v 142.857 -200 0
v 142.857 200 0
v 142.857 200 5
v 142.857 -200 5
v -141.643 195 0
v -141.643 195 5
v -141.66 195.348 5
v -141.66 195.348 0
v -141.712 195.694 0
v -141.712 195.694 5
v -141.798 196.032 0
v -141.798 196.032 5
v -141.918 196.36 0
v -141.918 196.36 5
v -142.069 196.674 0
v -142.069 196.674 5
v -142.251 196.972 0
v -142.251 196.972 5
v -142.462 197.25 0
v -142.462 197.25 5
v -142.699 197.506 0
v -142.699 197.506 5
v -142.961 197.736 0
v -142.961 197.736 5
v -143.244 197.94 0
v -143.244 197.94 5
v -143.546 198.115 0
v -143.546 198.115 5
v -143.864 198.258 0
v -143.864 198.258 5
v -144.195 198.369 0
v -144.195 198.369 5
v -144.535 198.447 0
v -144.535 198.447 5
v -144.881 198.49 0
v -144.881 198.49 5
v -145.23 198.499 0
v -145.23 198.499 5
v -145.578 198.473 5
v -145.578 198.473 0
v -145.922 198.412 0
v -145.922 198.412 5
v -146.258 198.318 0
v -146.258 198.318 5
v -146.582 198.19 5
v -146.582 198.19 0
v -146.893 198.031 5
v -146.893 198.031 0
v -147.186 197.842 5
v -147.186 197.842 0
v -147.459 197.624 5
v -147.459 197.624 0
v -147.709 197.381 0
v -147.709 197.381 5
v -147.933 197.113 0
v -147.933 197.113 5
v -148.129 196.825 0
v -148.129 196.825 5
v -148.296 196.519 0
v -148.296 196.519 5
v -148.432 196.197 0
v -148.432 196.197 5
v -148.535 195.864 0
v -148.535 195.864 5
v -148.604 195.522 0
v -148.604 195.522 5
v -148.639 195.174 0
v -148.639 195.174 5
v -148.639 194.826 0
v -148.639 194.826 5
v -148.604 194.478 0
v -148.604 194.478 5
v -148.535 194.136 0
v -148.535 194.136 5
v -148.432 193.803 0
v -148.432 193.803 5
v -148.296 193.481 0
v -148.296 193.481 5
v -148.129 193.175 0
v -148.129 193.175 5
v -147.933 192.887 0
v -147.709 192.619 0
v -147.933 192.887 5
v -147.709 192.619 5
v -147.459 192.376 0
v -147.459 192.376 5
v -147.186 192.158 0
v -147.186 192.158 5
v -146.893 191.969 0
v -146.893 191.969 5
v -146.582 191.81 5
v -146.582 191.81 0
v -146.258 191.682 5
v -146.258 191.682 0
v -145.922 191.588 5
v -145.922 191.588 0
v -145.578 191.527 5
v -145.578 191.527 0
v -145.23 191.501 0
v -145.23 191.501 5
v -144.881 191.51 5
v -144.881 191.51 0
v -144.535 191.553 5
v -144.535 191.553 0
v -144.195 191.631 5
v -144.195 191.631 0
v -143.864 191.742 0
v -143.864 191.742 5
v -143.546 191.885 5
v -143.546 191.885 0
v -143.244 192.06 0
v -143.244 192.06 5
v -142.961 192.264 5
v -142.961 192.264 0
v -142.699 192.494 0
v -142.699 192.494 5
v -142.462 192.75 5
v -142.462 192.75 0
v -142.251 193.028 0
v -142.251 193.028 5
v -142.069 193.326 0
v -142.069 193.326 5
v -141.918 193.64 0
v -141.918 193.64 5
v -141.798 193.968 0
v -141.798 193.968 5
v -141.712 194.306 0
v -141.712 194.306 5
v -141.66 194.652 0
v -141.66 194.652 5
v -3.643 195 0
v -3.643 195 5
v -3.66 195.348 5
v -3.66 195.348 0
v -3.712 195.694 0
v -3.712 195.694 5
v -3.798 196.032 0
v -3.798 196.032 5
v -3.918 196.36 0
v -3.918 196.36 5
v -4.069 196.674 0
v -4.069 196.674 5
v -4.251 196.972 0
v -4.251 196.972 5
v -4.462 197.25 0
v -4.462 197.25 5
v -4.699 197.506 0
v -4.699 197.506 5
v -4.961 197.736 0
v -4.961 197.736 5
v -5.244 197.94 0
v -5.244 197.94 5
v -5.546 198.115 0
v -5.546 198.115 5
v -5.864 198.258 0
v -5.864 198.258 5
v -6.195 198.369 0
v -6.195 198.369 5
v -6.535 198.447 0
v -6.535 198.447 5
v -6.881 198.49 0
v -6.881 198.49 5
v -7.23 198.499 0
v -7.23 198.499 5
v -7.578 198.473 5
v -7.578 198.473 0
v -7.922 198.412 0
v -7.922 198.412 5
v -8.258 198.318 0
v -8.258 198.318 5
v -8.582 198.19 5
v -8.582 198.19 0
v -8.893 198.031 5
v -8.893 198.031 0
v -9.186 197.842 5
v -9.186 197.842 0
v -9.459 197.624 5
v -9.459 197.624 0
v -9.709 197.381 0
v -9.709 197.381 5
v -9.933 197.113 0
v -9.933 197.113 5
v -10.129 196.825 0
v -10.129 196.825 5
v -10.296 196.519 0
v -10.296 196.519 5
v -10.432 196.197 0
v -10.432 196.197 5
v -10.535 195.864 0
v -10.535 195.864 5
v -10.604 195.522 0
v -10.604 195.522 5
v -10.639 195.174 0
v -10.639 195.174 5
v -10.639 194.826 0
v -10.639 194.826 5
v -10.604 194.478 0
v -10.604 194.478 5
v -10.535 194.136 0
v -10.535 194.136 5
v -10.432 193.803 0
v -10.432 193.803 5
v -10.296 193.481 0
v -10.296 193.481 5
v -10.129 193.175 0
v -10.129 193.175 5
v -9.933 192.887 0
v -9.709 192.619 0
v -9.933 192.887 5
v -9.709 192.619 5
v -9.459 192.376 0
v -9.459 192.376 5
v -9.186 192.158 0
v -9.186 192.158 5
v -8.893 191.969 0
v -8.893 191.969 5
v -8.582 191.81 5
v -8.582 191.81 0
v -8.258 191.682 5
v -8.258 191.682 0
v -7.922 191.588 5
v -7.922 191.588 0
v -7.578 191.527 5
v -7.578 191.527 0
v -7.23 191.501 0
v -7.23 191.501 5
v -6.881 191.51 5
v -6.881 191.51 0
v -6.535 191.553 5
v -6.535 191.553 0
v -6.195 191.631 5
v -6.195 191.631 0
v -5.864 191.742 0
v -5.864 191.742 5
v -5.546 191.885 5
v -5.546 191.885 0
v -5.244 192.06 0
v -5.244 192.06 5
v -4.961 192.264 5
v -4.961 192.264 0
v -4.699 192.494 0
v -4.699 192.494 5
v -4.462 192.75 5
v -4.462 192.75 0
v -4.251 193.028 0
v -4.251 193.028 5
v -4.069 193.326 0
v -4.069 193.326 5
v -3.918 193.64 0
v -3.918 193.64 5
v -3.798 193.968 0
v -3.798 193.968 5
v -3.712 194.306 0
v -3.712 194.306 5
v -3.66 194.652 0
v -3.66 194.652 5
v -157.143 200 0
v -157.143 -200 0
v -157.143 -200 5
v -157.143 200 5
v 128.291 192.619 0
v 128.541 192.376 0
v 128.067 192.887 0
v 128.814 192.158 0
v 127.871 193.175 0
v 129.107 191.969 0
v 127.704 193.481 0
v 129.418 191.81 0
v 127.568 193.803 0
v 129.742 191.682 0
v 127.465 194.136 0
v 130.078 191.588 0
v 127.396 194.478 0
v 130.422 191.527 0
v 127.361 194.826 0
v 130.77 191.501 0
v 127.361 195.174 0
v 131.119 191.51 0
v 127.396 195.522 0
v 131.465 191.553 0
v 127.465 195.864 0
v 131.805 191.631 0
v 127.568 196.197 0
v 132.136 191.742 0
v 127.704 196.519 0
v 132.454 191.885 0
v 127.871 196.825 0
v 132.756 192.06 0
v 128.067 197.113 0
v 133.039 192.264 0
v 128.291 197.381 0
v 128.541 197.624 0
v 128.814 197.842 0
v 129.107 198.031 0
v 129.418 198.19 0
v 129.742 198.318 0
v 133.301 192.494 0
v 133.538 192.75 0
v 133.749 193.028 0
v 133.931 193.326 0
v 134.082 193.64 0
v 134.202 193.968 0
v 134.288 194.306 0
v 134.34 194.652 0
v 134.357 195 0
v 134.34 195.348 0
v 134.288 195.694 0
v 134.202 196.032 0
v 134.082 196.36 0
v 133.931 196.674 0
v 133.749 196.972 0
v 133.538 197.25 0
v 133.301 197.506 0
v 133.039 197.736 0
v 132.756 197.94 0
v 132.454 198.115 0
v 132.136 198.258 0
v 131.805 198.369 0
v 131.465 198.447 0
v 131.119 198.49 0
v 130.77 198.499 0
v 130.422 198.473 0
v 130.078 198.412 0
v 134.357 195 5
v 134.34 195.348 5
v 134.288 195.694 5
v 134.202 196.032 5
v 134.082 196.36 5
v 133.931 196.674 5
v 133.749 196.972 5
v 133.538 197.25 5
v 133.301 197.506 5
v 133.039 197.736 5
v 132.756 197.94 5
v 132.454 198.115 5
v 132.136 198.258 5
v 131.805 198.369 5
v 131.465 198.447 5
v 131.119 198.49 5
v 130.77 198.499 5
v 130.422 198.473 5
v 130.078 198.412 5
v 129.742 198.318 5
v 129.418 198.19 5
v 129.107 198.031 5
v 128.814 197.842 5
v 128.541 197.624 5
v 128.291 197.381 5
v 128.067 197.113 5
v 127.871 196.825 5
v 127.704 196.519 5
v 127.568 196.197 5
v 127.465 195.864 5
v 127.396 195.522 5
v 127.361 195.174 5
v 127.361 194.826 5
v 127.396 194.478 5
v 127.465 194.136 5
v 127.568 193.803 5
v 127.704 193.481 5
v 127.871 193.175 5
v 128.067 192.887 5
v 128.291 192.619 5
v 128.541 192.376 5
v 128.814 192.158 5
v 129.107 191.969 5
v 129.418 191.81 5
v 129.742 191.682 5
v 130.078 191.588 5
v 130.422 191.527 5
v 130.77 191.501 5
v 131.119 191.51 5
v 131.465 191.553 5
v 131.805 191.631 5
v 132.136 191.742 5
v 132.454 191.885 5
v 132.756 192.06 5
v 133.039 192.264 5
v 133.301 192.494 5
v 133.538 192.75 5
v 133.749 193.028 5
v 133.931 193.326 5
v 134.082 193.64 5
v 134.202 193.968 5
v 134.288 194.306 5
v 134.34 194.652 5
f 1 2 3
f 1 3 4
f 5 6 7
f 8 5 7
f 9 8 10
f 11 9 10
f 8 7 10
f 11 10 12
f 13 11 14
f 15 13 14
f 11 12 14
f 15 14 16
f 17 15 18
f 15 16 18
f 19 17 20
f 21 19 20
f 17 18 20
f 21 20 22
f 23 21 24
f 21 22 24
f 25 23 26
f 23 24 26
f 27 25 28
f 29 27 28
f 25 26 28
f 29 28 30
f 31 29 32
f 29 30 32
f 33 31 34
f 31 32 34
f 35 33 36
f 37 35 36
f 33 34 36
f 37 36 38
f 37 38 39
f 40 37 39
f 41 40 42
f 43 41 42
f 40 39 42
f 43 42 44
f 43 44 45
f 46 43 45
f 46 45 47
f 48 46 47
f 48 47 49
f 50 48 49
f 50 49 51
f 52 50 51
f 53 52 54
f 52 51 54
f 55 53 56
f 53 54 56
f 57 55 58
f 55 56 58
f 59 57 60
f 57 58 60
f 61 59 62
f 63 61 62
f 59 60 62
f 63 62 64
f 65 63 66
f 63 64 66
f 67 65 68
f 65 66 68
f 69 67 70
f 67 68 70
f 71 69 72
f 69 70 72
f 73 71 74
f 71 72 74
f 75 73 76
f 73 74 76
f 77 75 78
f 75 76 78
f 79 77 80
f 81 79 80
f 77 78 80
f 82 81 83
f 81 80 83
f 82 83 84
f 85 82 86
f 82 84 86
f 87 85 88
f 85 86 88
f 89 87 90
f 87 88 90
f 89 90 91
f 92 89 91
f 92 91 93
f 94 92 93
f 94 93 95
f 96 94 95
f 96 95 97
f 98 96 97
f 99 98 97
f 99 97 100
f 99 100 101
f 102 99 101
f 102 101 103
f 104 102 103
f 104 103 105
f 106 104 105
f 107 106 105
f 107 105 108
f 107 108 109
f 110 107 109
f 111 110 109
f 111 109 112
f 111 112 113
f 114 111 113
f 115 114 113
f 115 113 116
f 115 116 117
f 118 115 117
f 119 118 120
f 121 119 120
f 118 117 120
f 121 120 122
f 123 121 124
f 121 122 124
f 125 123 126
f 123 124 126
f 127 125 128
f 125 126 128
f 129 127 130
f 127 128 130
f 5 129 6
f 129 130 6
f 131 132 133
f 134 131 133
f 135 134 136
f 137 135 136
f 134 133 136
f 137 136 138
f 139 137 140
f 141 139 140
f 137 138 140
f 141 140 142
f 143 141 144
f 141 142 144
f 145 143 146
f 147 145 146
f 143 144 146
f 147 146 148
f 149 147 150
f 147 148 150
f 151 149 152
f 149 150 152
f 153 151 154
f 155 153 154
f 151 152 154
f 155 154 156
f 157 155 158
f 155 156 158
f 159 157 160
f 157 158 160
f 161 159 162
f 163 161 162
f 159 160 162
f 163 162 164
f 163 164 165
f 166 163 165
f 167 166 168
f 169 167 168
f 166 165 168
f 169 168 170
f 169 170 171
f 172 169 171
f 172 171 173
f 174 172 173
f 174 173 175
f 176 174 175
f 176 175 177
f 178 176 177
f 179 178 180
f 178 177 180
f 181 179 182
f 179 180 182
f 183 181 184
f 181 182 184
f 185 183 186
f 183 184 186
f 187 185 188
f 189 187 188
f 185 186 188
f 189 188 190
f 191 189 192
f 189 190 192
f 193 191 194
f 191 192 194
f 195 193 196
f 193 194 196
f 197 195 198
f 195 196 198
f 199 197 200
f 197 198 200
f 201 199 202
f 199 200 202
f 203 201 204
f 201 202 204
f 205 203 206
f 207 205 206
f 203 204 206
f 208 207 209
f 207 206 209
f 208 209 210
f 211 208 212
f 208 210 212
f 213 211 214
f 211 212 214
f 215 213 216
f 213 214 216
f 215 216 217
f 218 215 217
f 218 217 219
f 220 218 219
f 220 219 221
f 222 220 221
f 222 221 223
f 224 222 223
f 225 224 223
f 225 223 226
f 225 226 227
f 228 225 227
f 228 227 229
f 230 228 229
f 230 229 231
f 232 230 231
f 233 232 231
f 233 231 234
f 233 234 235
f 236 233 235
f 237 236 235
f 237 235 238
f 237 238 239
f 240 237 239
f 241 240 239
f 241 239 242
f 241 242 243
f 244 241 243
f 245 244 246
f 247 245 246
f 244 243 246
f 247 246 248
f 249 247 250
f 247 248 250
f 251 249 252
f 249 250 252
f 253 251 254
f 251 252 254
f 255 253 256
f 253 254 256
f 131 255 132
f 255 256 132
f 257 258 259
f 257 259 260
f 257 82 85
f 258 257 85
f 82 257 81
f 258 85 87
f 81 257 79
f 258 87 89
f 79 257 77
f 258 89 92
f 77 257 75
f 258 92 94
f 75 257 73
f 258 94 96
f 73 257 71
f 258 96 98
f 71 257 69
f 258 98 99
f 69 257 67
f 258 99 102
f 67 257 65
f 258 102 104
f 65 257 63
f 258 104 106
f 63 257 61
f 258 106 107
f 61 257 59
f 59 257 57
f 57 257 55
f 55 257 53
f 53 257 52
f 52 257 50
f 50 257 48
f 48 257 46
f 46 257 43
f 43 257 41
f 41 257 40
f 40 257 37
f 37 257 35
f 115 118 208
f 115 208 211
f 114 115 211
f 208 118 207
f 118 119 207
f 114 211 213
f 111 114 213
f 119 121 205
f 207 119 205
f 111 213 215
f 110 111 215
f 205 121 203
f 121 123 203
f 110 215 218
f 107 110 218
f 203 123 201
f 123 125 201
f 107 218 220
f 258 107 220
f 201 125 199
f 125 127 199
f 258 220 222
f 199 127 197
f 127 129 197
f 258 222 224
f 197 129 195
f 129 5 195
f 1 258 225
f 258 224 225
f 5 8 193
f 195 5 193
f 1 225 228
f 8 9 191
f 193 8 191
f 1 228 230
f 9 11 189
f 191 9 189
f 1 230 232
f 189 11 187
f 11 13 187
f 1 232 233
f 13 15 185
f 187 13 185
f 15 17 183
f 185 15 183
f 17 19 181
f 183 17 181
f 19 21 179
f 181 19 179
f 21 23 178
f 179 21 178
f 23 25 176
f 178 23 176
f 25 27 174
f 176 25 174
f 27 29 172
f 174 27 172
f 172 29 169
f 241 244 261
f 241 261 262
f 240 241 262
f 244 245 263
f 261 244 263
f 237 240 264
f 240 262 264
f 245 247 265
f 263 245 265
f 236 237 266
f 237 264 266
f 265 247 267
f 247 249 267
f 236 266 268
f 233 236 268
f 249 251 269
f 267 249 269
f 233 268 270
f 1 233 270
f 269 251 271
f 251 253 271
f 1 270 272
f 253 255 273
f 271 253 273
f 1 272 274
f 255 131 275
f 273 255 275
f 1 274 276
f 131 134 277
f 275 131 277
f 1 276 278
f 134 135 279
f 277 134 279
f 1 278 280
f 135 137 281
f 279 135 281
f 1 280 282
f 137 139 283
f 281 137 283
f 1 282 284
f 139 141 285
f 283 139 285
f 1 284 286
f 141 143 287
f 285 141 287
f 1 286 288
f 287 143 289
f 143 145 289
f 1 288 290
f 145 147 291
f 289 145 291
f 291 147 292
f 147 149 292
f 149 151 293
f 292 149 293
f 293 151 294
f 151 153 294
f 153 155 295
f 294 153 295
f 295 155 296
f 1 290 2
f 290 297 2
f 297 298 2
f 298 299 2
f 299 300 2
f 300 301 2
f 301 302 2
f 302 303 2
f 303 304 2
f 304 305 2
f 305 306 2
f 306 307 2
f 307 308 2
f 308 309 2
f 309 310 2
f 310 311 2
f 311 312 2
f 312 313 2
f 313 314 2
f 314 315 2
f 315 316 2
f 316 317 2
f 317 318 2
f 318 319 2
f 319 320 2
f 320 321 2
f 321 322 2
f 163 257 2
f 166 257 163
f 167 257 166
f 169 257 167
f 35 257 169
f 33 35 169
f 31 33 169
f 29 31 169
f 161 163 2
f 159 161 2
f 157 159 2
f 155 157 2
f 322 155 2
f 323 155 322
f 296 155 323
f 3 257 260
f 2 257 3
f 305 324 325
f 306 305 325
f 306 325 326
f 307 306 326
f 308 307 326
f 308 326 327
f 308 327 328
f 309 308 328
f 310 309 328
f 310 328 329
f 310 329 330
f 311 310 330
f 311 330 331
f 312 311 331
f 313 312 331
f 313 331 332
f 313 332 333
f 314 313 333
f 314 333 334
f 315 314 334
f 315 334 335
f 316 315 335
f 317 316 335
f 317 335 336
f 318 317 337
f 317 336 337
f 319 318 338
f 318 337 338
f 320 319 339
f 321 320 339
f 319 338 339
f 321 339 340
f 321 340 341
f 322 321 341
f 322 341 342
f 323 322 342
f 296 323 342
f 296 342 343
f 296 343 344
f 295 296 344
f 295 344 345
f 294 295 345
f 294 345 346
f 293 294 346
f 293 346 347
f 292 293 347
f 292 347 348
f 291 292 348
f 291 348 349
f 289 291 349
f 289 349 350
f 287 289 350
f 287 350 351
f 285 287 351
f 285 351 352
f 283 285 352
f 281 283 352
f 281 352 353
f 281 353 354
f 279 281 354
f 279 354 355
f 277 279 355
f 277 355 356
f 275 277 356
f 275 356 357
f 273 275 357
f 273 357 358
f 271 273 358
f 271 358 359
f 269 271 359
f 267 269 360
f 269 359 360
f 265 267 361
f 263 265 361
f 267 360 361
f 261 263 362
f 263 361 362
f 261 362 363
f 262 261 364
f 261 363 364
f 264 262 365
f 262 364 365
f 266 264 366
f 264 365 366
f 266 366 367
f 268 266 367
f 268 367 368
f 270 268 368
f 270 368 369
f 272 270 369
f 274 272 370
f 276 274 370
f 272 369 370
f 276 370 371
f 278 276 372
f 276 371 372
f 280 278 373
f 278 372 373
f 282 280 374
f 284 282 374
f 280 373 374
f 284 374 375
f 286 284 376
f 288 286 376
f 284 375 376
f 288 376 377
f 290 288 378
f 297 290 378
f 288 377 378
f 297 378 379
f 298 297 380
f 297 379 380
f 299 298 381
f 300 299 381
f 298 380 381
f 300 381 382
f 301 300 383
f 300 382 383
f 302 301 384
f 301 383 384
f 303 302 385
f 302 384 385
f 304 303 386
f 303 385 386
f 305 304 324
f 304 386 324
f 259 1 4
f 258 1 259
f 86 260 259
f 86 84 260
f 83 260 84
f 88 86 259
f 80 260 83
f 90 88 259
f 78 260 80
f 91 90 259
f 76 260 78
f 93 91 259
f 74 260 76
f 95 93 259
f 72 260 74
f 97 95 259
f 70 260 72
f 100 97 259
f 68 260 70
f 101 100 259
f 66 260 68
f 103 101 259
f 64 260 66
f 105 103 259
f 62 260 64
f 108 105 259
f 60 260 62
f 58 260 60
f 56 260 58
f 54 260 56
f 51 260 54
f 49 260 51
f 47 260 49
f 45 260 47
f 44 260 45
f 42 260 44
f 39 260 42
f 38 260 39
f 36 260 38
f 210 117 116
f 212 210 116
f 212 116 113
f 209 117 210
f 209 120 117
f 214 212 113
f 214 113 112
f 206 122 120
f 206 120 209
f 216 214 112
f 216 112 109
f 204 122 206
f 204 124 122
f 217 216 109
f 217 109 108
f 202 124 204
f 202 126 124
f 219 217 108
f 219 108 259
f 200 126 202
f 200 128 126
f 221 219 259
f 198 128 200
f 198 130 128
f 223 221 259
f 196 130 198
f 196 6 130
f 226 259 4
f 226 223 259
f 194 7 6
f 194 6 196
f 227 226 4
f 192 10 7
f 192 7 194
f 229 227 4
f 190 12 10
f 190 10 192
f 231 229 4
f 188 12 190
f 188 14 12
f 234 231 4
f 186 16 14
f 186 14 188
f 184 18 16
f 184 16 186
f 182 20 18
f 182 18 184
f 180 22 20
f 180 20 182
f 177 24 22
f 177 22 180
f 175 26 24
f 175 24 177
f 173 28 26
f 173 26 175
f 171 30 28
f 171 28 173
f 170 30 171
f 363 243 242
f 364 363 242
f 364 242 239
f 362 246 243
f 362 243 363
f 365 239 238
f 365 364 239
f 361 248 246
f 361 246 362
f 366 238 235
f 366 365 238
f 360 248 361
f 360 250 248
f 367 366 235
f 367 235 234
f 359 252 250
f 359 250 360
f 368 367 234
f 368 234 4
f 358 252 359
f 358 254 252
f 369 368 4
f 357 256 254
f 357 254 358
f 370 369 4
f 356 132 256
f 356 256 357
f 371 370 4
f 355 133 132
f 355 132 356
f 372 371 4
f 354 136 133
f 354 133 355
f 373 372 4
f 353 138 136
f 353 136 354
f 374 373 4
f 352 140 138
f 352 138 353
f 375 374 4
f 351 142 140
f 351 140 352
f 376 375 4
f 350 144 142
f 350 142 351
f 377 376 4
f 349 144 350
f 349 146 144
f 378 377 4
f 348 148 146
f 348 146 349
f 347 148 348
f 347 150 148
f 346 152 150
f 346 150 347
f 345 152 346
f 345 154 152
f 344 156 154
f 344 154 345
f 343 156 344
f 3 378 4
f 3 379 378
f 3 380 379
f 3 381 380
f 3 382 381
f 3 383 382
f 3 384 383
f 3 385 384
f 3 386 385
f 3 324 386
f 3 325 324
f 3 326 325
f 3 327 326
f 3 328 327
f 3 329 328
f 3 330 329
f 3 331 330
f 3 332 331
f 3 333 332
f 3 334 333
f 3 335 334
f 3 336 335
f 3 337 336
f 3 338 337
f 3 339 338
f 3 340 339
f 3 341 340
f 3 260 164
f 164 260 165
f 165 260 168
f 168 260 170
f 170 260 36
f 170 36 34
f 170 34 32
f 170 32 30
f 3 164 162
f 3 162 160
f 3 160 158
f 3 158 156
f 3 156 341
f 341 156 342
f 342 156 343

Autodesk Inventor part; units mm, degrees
ref_plane "YZ Plane" through (0, 0, 0) normal (1, 0, 0) x (0, 1, 0)
ref_plane "XZ Plane" through (0, 0, 0) normal (0, 1, 0) x (-1, 0, 0)
ref_plane "XY Plane" through (0, 0, 0) normal (0, 0, 1) x (1, 0, 0)
sketch "Sketch1" plane through (0, 0, 0) normal (0, 0, 1) x (1, 0, 0)
  line L0 (-157.1429, 200) -> (142.8571, 200)
  line L1 (142.8571, 200) -> (142.8571, -200)
  line L2 (142.8571, -200) -> (-157.1429, -200)
  line L3 (-157.1429, -200) -> (-157.1429, 200)
  point P0 (0, 0)
  dimension "d0" = 400
  dimension "d1" = 300
  dimension "d2" = 142.8571
  dimension "d3" = 200
extrude "Extrusion1" add sketch "Sketch1" along normal blind 5
sketch "Sketch3" plane through (0, 0, 5) normal (0, 0, 1) x (1, 0, 0)
  circle A0 centre (130.8571, 195) radius 3.5
  circle A1 centre (-145.1429, 195) radius 3.5
  circle A2 centre (-7.1429, 195) radius 3.5
  line L0 (142.8571, -200) -> (142.8571, 200) projected
  line L1 (-157.1429, 200) -> (-157.1429, -200) projected
  line L2 (142.8571, 200) -> (-157.1429, 200) projected
  point P0 (0, 0)
  dimension "d6" = 7
  dimension "d7" = 7
  dimension "d8" = 7
  dimension "d9" = 12
  dimension "d10" = 12
  dimension "d11" = 150
  dimension "d12" = 5
  dimension "d13" = 5
  dimension "d14" = 5
extrude "Extrusion2" cut sketch "Sketch3" against normal blind 10
properties part number "Perspex shield" material "Glass"
